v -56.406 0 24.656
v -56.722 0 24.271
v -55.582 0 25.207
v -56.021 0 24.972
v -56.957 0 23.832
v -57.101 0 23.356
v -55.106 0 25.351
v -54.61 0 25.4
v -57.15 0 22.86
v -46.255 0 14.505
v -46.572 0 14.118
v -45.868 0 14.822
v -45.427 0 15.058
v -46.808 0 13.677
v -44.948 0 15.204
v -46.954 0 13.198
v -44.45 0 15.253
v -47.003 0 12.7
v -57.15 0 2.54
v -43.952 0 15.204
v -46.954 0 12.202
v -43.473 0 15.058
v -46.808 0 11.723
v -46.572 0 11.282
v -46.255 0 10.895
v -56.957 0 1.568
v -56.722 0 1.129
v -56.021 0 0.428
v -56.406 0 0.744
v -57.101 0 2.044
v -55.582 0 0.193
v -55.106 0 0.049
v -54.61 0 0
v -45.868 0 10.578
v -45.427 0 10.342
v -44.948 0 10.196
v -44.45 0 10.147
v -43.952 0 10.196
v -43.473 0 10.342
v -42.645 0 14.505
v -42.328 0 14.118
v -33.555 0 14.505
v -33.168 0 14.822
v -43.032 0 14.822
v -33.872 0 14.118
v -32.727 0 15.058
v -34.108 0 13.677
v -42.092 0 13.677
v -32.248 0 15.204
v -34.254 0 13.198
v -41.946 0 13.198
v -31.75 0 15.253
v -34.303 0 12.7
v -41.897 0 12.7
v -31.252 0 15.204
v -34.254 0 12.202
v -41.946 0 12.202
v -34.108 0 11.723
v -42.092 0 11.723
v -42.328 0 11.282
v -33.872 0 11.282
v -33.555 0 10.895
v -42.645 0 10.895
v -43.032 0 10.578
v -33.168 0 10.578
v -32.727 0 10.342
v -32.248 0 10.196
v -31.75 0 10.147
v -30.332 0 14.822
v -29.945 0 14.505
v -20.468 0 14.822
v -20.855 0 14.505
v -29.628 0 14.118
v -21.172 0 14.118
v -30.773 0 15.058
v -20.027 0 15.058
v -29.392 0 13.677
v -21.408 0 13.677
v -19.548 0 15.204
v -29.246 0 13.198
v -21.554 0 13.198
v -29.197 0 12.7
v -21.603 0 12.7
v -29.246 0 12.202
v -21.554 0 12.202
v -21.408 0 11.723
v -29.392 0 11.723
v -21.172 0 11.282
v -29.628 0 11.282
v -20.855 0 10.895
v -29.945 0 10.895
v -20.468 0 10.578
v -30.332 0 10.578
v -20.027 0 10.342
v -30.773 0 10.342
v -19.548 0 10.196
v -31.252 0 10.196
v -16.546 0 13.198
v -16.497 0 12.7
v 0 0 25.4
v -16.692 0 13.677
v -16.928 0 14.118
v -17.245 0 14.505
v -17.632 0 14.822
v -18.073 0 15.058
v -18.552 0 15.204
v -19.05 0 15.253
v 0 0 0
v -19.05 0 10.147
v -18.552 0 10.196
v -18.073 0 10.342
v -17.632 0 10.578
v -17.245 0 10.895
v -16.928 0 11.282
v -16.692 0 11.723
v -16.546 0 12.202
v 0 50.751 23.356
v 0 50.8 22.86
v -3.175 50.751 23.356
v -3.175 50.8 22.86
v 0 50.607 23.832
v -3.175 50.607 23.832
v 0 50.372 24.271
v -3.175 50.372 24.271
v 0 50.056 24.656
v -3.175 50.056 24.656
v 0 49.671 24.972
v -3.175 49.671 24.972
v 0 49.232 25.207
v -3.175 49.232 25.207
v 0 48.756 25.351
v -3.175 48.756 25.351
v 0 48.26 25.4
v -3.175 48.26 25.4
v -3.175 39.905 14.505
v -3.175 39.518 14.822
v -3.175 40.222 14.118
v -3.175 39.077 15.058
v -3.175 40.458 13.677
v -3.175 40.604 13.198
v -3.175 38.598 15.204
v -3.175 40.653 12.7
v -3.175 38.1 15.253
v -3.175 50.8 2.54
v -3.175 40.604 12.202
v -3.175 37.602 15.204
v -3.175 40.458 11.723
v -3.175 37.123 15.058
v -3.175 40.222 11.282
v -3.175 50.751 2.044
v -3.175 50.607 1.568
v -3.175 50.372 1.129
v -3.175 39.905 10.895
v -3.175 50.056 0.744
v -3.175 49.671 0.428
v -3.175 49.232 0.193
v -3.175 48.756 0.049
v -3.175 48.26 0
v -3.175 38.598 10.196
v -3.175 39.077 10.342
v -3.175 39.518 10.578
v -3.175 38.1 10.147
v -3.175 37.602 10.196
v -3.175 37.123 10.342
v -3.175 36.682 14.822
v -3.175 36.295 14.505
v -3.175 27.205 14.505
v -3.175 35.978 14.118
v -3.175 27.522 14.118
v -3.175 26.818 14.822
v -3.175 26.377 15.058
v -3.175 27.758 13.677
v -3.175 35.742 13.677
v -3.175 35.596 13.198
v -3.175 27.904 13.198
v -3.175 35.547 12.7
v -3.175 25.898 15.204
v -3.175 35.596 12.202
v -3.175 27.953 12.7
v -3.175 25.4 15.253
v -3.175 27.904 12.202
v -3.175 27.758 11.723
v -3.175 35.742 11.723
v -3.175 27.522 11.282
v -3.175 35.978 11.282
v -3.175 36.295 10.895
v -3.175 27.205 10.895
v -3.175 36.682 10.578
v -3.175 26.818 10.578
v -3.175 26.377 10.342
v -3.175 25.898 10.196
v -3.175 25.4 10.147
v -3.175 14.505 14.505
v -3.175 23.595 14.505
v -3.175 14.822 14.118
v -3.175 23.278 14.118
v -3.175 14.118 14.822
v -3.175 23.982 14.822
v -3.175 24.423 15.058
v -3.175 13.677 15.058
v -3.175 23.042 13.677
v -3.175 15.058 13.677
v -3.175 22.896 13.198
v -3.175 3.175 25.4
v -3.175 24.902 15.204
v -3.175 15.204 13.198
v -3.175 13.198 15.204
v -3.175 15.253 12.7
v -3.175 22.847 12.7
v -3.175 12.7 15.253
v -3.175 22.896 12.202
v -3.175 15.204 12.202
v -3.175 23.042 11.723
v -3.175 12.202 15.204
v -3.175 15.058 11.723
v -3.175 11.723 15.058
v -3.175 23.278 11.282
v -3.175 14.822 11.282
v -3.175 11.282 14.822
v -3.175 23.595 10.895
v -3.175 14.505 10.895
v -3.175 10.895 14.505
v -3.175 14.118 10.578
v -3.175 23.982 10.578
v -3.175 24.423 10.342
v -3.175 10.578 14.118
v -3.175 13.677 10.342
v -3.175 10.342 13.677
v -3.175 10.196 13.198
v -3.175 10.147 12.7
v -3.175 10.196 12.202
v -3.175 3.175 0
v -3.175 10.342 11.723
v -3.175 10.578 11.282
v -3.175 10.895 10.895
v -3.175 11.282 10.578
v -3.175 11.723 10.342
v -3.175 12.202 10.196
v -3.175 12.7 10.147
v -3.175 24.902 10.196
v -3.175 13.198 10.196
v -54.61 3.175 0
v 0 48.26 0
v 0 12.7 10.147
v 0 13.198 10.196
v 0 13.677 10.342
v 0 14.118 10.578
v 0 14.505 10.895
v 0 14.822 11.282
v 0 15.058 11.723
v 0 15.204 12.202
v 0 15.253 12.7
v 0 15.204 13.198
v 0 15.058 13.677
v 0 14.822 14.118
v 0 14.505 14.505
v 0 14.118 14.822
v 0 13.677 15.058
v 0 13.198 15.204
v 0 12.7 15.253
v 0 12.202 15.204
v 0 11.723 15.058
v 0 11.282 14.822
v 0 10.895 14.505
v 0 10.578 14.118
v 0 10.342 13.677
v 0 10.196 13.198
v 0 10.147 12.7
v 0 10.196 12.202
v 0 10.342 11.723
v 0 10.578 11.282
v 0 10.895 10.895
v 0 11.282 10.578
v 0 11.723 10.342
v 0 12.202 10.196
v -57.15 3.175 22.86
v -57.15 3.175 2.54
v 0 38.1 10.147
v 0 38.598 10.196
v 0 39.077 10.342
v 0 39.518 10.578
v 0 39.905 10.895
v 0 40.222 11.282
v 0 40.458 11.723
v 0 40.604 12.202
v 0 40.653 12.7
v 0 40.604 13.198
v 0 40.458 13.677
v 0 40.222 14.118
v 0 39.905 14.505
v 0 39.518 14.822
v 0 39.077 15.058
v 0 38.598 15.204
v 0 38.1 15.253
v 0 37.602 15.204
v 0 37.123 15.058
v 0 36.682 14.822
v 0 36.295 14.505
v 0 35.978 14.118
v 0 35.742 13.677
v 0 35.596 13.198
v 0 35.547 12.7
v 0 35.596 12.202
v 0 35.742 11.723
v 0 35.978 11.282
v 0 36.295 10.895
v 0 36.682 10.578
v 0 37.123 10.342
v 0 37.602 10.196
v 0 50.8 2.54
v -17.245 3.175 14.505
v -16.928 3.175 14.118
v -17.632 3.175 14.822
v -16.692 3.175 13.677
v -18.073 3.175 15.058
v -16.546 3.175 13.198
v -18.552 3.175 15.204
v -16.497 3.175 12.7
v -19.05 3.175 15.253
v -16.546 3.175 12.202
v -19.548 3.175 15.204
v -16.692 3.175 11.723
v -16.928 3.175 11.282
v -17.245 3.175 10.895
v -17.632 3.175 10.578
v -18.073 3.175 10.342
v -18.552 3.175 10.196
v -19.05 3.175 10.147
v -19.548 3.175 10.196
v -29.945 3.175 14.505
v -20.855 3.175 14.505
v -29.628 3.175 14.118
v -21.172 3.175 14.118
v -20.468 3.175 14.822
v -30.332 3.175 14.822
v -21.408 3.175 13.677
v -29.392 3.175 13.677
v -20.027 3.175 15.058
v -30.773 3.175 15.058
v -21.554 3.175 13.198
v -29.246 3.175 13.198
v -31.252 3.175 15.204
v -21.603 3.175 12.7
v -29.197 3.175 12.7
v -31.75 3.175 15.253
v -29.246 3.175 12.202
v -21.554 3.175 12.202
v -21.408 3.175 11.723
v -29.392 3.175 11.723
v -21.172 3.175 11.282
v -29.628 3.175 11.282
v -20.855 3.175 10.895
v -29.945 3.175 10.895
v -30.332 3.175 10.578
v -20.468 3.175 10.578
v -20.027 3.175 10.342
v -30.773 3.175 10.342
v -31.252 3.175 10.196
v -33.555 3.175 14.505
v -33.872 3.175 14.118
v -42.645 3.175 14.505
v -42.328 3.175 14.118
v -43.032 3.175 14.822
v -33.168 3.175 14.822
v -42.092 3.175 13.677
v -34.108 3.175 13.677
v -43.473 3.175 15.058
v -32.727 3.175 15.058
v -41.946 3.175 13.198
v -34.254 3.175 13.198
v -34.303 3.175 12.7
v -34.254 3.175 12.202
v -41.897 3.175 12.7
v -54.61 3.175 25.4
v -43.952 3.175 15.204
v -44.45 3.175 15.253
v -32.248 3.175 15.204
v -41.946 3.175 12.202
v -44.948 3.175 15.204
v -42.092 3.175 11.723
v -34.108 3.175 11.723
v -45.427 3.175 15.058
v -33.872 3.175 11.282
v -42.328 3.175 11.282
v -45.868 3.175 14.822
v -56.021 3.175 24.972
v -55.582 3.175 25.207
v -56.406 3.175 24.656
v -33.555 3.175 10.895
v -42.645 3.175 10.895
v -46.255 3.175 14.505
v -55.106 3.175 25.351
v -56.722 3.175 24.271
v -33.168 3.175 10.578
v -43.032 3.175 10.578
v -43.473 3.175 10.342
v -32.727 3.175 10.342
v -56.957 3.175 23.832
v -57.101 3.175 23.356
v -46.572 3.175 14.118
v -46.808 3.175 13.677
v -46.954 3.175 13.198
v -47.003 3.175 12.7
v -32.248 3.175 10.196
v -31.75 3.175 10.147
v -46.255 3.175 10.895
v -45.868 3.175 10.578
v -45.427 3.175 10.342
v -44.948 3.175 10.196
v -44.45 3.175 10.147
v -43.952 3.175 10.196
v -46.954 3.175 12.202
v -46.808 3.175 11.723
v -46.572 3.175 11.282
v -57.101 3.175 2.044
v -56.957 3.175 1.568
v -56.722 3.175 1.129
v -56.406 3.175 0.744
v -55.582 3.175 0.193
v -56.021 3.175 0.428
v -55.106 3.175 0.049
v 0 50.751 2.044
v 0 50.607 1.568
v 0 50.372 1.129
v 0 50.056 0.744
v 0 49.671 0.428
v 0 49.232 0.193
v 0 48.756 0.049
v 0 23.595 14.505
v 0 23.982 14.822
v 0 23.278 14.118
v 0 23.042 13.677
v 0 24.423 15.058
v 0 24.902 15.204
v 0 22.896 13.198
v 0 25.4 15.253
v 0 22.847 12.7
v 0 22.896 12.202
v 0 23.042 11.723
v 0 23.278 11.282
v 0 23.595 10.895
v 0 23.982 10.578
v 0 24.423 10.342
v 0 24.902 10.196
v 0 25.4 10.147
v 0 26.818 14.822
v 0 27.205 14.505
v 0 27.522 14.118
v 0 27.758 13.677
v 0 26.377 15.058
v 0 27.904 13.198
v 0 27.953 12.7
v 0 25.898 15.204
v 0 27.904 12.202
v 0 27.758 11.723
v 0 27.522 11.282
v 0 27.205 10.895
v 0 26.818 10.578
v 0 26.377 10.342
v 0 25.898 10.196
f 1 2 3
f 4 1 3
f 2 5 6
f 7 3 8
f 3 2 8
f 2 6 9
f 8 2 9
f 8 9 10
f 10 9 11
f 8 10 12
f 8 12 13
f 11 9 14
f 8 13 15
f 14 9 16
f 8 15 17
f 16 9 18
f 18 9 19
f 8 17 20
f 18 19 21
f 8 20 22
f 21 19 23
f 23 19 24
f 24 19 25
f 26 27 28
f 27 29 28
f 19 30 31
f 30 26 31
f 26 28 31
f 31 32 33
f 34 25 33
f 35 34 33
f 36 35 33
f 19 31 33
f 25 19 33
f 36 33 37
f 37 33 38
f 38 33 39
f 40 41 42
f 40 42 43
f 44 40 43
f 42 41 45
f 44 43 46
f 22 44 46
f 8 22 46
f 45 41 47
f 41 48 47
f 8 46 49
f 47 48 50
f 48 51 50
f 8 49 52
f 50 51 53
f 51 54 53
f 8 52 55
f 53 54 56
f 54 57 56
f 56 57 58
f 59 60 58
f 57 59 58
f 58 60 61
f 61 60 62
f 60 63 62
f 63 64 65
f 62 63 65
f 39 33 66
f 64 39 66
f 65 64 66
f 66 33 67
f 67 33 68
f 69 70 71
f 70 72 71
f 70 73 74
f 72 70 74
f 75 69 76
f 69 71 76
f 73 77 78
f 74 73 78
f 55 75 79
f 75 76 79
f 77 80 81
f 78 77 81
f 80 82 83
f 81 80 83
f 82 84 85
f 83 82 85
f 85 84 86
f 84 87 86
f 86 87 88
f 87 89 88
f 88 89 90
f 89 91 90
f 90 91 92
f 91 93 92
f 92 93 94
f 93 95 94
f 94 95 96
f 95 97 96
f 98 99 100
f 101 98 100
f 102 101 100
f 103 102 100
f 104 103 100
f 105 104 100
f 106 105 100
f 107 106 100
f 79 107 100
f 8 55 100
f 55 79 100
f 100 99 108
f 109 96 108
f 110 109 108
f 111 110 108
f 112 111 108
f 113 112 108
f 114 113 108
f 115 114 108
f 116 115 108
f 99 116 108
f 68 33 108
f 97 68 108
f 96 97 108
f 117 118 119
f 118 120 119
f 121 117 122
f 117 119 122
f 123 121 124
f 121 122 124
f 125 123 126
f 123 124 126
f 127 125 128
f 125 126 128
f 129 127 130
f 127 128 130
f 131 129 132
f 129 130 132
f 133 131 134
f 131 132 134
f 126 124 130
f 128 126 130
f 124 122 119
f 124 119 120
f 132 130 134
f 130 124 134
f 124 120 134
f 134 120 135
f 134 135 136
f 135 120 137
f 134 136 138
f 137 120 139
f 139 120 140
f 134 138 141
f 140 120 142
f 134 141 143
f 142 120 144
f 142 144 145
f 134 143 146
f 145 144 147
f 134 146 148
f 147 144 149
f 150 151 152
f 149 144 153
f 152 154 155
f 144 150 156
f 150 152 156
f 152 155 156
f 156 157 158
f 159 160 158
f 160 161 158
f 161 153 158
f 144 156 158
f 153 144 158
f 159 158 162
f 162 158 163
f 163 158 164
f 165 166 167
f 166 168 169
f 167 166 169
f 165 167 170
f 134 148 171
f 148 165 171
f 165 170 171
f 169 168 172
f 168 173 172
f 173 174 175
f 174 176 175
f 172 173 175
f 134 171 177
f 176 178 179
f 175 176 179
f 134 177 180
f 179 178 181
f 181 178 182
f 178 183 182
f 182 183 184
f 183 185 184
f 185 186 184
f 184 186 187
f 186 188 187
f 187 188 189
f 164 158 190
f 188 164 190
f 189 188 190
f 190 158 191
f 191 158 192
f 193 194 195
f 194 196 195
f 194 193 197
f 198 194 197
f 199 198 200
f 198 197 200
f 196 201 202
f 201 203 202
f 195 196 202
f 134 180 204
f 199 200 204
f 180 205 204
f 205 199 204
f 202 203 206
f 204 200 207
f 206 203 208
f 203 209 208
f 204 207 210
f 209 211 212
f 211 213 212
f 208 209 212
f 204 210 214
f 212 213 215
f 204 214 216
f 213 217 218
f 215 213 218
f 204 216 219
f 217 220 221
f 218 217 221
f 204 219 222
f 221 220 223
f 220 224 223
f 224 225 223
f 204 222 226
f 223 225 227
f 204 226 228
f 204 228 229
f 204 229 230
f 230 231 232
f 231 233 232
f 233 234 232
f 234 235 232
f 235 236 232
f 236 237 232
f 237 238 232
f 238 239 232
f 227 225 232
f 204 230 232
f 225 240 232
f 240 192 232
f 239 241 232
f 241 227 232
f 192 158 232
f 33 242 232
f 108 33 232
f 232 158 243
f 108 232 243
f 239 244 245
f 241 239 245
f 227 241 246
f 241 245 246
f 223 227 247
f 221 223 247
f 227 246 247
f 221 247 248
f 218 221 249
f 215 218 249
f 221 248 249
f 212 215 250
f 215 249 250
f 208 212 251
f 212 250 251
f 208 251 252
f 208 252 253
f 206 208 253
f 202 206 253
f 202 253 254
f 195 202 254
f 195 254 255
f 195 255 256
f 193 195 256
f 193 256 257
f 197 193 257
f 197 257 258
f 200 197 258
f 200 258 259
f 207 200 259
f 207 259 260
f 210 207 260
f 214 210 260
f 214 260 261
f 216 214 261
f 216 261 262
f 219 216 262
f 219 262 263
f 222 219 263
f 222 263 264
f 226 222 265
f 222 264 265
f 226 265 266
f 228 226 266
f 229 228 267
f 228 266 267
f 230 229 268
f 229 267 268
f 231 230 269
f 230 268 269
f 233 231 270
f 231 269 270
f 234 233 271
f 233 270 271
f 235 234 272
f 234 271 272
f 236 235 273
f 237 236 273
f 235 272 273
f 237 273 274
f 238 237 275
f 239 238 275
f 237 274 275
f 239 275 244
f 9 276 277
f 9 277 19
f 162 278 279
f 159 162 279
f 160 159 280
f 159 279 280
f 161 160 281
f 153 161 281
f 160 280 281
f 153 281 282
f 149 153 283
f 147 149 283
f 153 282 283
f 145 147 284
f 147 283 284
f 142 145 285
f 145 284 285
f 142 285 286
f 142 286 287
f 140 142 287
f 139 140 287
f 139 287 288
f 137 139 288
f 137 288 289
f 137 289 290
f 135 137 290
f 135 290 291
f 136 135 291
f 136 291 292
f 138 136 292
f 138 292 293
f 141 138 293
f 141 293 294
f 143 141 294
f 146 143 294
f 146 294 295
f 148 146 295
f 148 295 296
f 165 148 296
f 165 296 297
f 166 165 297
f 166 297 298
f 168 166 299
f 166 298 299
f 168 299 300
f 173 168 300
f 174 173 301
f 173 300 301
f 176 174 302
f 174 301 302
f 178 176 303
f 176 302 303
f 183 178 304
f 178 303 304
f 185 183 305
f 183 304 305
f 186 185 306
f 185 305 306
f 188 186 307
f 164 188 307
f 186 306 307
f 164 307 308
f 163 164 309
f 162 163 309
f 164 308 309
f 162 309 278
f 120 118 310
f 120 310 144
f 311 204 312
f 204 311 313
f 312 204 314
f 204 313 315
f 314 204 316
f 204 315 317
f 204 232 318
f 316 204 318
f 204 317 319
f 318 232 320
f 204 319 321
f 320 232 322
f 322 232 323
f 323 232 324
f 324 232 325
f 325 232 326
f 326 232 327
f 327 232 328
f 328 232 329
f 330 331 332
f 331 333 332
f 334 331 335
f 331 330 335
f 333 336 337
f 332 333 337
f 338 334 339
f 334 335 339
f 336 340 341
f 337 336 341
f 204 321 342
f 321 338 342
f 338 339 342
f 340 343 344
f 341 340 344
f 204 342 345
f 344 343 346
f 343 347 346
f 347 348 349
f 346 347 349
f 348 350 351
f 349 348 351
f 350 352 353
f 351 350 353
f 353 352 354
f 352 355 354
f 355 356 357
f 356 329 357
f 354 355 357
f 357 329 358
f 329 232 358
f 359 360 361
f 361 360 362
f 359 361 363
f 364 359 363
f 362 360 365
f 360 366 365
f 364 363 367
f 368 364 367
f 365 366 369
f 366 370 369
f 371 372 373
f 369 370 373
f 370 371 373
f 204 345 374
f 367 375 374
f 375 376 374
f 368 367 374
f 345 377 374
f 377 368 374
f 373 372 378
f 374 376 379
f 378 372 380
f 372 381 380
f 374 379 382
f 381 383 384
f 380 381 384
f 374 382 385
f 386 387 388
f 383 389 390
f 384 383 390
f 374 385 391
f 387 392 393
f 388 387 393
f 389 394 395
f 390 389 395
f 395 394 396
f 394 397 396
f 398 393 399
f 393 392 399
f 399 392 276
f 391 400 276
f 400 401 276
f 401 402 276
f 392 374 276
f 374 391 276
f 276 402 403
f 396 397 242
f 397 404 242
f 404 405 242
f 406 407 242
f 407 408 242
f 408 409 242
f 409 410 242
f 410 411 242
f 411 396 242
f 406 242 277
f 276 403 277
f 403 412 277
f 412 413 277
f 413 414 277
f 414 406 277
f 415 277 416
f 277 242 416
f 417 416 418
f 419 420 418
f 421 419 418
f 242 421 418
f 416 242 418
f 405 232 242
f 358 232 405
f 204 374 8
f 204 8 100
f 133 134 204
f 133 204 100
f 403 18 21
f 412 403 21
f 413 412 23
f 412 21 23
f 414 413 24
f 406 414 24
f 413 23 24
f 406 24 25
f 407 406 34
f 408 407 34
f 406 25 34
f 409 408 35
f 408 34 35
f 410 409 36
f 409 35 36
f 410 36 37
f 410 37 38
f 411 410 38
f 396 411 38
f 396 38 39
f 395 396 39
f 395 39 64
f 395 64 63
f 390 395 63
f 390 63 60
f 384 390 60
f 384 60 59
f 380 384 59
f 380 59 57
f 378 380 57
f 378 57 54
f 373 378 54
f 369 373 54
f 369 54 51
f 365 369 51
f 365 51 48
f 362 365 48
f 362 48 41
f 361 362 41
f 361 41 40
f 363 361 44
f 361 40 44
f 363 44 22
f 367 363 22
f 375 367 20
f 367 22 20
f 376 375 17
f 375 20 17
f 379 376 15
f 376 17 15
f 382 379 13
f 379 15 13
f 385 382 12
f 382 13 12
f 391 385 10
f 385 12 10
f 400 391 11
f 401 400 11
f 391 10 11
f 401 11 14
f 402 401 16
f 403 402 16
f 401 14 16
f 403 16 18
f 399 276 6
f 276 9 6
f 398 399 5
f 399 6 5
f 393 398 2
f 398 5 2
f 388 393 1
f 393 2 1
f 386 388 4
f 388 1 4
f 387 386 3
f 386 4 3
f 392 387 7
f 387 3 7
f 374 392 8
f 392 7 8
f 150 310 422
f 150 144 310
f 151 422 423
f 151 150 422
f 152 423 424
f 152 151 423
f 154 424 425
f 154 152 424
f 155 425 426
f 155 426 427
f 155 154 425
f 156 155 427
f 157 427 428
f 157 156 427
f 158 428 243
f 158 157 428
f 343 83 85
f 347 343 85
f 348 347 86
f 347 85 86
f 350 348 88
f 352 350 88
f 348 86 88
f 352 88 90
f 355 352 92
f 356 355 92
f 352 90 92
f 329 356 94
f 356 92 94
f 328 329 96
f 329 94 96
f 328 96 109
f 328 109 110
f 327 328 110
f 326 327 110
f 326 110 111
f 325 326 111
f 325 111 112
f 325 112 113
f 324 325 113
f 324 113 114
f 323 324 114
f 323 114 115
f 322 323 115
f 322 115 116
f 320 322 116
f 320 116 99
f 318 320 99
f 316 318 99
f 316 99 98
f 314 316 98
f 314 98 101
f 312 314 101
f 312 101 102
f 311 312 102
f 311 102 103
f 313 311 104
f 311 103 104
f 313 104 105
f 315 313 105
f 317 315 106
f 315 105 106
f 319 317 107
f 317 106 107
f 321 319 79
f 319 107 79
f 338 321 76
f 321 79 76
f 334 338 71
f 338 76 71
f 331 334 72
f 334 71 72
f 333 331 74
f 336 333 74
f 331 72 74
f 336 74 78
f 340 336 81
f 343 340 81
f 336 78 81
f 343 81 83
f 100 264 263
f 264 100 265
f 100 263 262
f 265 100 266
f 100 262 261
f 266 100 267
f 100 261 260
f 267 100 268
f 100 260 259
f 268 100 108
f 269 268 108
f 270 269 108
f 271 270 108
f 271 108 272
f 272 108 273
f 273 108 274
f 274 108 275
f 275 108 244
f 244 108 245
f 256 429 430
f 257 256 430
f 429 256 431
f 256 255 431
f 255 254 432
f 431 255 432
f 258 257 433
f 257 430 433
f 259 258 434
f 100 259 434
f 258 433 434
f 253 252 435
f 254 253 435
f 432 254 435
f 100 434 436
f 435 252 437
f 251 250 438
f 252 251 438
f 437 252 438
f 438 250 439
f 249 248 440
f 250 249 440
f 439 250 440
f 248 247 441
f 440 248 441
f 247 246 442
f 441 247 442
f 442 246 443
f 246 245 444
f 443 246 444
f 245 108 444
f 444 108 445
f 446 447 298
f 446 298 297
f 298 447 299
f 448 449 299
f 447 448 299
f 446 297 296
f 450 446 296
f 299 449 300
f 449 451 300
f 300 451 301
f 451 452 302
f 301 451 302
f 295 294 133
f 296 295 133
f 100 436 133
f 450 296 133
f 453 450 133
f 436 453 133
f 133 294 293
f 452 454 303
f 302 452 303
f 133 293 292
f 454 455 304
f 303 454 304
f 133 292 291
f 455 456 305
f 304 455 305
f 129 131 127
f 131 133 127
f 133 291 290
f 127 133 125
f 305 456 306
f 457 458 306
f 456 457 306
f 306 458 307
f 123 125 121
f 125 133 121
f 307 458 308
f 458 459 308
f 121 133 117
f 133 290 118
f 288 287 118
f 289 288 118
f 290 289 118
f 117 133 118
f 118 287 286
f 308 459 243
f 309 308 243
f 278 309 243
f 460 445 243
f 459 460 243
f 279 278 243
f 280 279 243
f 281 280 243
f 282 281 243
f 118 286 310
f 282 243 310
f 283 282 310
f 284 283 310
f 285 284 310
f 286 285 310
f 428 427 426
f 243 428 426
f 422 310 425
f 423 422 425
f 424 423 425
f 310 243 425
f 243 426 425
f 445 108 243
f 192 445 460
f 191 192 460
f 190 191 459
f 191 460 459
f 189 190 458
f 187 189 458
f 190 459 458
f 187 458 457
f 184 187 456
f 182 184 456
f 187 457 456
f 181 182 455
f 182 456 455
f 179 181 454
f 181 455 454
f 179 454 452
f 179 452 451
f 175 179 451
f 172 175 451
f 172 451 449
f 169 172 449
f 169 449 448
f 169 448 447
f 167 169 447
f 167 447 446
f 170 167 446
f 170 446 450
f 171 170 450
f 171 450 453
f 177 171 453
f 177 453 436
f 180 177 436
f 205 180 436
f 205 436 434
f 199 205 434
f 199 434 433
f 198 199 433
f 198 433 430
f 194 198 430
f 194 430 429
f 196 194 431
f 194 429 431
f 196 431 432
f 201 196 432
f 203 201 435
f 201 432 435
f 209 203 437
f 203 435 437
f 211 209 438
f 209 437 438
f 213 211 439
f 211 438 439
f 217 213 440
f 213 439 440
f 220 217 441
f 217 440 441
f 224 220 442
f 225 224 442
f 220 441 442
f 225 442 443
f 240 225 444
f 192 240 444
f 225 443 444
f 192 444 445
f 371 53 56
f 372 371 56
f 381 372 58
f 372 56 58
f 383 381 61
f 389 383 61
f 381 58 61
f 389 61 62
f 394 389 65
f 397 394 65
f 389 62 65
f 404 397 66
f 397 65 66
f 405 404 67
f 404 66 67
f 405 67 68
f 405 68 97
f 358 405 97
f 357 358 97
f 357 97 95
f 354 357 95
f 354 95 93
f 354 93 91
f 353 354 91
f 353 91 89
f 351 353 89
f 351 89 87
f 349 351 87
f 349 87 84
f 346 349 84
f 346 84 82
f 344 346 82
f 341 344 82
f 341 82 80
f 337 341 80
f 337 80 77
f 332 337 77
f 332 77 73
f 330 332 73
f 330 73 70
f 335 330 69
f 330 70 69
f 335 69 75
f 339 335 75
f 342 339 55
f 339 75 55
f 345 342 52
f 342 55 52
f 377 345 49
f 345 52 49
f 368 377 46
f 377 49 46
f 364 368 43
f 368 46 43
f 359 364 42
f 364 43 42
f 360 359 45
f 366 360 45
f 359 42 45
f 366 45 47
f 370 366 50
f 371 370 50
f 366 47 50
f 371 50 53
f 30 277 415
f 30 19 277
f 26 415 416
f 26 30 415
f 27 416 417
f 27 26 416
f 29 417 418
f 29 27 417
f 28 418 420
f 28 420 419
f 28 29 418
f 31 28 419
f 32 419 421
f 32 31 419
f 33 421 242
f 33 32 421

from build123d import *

# Parameters (mm, degrees)
BOSS_EXTRUDE1_DEPTH    = 25.4
FILLET1_R              = 2.54
F_10_CLEARANCE_HOLE1_D = 5.1054
F_10_CLEARANCE_HOLE2_D = 5.1054


with BuildPart() as part:
    # Sketch1 → Boss-Extrude1 (new body)
    with BuildSketch(Plane.XY):
        Polygon((0, 0), (0, 50.8), (-3.175, 50.8), (-3.175, 3.175), (-57.15, 3.175), (-57.15, 0), align=None)
    extrude(amount=BOSS_EXTRUDE1_DEPTH)

    # Fillet1
    fillet1_edges = [part.edges().sort_by_distance(p)[0] for p in [
        (-1.5875, 50.8, 25.4),
        (-57.15, 1.5875, 25.4),
        (-57.15, 1.5875, 0),
        (-1.5875, 50.8, 0),
    ]]
    fillet(fillet1_edges, radius=FILLET1_R)

    # #10 Clearance Hole1 (through all)
    with Locations(Plane.ZY.offset(3.175)):
        with Locations((12.7, 38.1), (12.7, 25.4), (12.7, 12.7)):
            Hole(F_10_CLEARANCE_HOLE1_D / 2)

    # #10 Clearance Hole2 (through all)
    with Locations(Plane(origin=(0, 3.175, 0), x_dir=(1, 0, 0), z_dir=(0, 1, 0))):
        with Locations((-19.05, -12.7), (-31.75, -12.7), (-44.45, -12.7)):
            Hole(F_10_CLEARANCE_HOLE2_D / 2)


solid = part.part
